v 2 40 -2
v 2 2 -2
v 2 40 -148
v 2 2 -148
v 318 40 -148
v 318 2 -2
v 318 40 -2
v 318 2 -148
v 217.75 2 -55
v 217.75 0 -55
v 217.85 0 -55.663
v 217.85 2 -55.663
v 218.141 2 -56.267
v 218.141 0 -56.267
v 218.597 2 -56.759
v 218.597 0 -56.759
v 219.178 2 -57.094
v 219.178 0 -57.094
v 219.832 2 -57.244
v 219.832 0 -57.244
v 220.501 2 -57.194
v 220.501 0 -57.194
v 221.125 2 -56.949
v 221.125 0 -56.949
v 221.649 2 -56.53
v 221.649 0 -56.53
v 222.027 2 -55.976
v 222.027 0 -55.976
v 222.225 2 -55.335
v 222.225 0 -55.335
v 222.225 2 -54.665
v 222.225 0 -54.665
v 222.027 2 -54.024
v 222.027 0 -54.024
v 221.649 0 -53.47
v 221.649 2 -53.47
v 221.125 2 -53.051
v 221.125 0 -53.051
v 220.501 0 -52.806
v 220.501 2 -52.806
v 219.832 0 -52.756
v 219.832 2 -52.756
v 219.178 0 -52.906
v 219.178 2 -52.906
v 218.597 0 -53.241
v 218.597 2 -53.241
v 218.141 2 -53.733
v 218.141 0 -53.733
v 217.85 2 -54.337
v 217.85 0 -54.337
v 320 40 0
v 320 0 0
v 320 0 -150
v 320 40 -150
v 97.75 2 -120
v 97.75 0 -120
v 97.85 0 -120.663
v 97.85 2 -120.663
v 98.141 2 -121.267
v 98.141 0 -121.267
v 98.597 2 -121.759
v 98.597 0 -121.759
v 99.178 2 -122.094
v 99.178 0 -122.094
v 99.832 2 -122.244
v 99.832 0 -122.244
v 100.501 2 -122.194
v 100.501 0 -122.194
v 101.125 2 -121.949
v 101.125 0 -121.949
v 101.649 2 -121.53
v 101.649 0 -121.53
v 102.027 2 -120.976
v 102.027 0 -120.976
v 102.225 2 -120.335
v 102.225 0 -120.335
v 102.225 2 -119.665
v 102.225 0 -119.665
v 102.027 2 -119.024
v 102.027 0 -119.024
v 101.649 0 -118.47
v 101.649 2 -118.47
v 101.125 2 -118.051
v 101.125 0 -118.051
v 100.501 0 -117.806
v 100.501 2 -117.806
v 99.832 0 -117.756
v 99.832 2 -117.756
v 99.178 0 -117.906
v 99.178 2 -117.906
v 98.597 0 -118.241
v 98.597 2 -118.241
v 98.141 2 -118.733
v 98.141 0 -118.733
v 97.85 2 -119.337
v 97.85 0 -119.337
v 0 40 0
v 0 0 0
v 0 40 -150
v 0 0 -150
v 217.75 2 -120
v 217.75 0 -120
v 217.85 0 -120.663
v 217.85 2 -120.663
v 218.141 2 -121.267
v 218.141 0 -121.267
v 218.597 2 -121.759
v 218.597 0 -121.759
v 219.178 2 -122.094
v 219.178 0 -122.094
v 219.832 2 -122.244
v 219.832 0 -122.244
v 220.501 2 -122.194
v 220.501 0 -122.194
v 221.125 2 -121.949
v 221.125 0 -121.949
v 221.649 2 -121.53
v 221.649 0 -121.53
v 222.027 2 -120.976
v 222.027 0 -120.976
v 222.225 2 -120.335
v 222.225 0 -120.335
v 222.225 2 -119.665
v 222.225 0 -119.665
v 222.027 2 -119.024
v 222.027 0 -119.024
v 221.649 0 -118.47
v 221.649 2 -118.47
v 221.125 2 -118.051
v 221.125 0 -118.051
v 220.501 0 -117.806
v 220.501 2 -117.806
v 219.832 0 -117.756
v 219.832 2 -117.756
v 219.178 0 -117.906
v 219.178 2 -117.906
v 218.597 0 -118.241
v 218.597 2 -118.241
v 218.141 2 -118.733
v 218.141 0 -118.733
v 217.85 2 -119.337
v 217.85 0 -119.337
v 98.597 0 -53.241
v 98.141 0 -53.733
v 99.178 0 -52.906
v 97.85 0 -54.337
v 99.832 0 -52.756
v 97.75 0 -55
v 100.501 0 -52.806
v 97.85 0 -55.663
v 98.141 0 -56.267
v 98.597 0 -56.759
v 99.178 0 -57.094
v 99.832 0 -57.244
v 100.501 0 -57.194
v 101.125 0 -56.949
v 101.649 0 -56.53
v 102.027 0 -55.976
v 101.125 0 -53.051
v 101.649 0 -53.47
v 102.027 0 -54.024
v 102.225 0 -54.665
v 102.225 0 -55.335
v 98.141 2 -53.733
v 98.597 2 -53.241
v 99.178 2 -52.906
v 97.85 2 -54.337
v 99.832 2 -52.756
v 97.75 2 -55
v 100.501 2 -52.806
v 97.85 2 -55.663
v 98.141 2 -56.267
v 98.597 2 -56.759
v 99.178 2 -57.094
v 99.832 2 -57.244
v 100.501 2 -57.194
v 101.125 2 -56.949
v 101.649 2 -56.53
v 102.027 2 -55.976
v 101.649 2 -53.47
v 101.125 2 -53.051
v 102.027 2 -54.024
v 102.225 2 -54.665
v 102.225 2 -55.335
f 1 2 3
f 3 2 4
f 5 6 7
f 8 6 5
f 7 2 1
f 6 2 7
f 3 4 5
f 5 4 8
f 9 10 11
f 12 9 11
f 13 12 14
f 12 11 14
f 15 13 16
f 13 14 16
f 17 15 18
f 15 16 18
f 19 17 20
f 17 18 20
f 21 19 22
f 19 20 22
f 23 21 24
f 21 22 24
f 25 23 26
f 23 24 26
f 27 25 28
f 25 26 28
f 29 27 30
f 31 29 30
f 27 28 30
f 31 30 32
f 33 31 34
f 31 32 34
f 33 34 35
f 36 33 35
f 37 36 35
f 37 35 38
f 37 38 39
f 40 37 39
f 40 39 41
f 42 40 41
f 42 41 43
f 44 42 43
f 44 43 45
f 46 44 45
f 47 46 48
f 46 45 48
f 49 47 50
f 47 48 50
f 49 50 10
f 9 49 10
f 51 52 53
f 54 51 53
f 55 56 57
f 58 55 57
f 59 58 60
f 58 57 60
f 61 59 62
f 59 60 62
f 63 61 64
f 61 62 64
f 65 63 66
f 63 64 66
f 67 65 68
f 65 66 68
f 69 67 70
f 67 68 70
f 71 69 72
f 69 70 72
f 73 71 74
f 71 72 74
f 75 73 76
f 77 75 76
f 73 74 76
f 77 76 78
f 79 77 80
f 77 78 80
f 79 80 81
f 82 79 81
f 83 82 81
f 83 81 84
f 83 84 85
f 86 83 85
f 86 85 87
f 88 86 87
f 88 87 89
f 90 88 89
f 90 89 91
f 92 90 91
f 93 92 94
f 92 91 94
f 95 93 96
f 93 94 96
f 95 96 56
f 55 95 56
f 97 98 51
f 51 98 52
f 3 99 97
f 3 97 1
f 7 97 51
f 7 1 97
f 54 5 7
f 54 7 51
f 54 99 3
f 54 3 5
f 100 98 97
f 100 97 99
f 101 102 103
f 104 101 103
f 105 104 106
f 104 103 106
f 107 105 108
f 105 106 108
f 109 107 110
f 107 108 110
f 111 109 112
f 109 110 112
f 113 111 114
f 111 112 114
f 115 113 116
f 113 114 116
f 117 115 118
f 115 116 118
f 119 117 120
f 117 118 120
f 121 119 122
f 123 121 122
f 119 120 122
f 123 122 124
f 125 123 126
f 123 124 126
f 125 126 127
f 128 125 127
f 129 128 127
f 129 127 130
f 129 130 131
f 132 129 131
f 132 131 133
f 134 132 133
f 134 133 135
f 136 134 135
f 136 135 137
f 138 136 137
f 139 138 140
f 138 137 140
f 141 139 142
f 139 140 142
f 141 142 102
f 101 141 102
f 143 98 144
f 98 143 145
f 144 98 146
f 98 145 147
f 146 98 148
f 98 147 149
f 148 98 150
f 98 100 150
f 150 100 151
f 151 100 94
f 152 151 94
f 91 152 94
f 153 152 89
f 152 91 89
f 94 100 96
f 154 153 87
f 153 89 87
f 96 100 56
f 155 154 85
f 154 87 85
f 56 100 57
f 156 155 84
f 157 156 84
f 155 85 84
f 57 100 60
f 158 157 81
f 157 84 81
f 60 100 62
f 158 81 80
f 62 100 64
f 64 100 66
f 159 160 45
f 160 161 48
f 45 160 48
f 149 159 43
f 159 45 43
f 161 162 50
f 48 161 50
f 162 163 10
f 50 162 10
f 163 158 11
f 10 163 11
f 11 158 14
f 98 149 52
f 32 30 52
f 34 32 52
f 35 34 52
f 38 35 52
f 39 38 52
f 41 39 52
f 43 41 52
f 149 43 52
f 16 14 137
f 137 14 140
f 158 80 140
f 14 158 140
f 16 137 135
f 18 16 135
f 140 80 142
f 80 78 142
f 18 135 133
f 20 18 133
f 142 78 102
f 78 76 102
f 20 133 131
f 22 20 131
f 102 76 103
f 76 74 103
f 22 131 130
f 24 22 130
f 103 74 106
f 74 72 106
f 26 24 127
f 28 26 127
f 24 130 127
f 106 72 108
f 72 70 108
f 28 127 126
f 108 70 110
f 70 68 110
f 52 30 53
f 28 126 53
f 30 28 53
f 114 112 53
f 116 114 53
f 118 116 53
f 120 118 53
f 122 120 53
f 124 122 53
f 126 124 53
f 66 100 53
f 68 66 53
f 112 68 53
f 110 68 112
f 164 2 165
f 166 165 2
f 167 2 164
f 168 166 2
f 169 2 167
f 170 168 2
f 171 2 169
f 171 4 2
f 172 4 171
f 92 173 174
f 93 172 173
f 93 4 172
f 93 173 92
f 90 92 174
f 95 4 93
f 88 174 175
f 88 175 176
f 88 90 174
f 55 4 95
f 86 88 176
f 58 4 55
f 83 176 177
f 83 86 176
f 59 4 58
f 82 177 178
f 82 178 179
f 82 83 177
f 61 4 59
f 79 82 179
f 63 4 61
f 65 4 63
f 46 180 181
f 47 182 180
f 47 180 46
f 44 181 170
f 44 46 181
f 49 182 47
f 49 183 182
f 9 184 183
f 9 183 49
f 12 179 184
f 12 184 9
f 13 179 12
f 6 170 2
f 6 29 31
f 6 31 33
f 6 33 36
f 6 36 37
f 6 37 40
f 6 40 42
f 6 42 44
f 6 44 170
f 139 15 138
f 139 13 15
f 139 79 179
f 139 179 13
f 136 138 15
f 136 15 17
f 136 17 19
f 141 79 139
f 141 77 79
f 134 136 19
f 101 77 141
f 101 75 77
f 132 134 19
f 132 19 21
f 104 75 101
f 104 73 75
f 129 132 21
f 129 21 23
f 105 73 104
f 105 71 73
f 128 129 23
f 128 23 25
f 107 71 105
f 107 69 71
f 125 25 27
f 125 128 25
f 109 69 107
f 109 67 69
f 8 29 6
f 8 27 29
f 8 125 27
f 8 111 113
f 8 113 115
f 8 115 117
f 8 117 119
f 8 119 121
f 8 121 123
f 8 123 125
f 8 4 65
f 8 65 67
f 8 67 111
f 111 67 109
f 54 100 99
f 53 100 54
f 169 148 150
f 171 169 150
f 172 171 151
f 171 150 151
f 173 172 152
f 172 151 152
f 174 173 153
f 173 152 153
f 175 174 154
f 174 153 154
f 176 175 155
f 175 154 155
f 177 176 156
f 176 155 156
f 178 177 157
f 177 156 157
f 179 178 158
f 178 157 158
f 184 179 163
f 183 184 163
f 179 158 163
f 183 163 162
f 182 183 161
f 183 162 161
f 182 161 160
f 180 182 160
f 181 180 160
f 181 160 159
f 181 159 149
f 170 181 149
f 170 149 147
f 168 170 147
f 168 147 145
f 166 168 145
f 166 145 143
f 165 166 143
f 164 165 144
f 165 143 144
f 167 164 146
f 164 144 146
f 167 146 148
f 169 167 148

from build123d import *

# Parameters (mm, degrees)
SKETCH_1_W          = 320
SKETCH_1_H          = 150
EXTRUDE_1_DEPTH     = 40
SHELL_1_T           = -2
SKETCH_2_R          = 2.25
CUT_EXTRUDE_1_DEPTH = 2


with BuildPart() as part:
    # 草图1 → 凸台-拉伸1 (new body)
    with BuildSketch(Plane(origin=(0, 0, 0), x_dir=(1, 0, 0), z_dir=(0, 1, 0))):
        with Locations((160, 75)):
            Rectangle(SKETCH_1_W, SKETCH_1_H)
    extrude(amount=EXTRUDE_1_DEPTH)

    # 抽壳1
    shell_1_openings = [part.faces().sort_by_distance(p)[0] for p in [
        (160, 40, -75),
    ]]
    offset(amount=SHELL_1_T, openings=shell_1_openings, kind=Kind.INTERSECTION)

    # 草图2 → 切除-拉伸1 (cut)
    with BuildSketch(Plane(origin=(0, 0, 0), x_dir=(-1, 0, 0), z_dir=(0, -1, 0))):
        with Locations((-100, 55)):
            Circle(SKETCH_2_R)
        with Locations((-220, 55)):
            Circle(SKETCH_2_R)
        with Locations((-220, 120)):
            Circle(SKETCH_2_R)
        with Locations((-100, 120)):
            Circle(SKETCH_2_R)
    extrude(amount=-CUT_EXTRUDE_1_DEPTH, mode=Mode.SUBTRACT)


solid = part.part
